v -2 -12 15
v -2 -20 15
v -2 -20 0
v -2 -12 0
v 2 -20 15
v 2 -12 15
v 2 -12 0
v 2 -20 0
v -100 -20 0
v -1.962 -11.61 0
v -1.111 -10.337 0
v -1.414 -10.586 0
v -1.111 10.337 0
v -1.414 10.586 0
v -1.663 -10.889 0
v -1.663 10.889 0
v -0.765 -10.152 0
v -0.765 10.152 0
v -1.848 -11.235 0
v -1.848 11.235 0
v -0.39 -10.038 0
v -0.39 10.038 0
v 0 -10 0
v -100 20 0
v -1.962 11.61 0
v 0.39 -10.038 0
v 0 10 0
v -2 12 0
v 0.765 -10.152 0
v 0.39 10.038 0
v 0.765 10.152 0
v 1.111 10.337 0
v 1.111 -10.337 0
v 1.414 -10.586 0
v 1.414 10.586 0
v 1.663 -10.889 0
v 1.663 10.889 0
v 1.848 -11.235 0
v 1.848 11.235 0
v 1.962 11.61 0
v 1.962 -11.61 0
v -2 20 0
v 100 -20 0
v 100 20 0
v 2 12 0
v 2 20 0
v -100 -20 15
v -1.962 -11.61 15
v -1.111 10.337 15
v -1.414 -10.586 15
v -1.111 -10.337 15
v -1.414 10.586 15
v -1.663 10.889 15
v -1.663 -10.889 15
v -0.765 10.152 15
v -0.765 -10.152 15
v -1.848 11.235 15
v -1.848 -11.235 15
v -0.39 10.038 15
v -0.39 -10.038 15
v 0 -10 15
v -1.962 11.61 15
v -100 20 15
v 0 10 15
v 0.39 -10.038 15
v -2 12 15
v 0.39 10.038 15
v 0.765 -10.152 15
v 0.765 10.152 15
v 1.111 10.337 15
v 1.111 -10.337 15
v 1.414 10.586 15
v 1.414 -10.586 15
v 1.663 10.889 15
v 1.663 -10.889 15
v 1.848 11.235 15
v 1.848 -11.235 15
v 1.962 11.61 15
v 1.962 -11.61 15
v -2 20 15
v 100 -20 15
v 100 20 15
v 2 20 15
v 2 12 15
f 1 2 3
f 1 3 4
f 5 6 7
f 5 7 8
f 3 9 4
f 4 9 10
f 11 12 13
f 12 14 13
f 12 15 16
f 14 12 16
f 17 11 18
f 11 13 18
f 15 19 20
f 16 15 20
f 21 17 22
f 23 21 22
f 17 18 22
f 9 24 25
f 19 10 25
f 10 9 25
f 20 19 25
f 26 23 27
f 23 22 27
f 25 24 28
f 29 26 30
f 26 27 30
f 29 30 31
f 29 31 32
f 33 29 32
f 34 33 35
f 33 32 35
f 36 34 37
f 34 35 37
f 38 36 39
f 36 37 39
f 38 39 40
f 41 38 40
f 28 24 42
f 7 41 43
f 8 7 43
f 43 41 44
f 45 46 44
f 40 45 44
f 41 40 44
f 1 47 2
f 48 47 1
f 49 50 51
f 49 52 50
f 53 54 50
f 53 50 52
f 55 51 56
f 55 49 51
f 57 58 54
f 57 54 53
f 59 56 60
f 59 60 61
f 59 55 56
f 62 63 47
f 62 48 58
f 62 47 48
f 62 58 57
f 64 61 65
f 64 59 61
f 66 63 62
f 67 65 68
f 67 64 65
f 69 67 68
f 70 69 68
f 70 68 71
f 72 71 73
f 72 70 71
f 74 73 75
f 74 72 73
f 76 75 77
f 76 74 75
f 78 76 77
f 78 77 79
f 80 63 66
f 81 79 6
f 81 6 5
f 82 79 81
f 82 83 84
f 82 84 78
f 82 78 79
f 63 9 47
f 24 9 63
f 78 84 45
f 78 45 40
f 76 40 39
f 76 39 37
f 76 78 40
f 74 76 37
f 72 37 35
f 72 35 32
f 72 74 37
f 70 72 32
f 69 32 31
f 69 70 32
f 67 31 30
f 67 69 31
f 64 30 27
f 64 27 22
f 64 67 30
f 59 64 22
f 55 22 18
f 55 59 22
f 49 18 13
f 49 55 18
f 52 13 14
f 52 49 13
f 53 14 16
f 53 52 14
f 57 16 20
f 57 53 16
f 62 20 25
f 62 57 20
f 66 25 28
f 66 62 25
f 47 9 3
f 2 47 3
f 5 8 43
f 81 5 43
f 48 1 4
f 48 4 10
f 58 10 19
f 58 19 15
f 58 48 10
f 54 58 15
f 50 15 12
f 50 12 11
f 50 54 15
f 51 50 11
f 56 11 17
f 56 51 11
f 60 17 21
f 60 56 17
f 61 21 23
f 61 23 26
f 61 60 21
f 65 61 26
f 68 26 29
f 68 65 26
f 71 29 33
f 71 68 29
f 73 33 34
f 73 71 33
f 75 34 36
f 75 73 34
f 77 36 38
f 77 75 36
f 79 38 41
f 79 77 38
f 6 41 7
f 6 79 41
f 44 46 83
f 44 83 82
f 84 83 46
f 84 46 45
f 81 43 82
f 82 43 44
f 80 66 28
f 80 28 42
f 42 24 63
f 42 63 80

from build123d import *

# Parameters (mm, degrees)
SKETCH1_W                                = 200
SKETCH1_H                                = 40
RECTANGULAR_BAR_40_W_X_200_L_X_15D_DEPTH = 15
NOTCH_CUT_OUT_DEPTH                      = 15


with BuildPart() as part:
    # Sketch1 → Rectangular Bar (40 W x 200 L x 15D) (new body)
    with BuildSketch(Plane.XY):
        Rectangle(SKETCH1_W, SKETCH1_H)
    extrude(amount=RECTANGULAR_BAR_40_W_X_200_L_X_15D_DEPTH)

    # Notch → Notch cut out (cut)
    with BuildSketch(Plane.XY.offset(15)):
        with BuildLine():
            Line((2, 20), (2, 12))
            ThreePointArc((2, 12), (0, 10), (-2, 12))
            Line((-2, 12), (-2, 20))
            Line((-2, 20), (2, 20))
        make_face()
        with BuildLine():
            Line((-2, -20), (-2, -12))
            ThreePointArc((-2, -12), (0, -10), (2, -12))
            Line((2, -12), (2, -20))
            Line((2, -20), (-2, -20))
        make_face()
    extrude(amount=-NOTCH_CUT_OUT_DEPTH, mode=Mode.SUBTRACT)


solid = part.part
